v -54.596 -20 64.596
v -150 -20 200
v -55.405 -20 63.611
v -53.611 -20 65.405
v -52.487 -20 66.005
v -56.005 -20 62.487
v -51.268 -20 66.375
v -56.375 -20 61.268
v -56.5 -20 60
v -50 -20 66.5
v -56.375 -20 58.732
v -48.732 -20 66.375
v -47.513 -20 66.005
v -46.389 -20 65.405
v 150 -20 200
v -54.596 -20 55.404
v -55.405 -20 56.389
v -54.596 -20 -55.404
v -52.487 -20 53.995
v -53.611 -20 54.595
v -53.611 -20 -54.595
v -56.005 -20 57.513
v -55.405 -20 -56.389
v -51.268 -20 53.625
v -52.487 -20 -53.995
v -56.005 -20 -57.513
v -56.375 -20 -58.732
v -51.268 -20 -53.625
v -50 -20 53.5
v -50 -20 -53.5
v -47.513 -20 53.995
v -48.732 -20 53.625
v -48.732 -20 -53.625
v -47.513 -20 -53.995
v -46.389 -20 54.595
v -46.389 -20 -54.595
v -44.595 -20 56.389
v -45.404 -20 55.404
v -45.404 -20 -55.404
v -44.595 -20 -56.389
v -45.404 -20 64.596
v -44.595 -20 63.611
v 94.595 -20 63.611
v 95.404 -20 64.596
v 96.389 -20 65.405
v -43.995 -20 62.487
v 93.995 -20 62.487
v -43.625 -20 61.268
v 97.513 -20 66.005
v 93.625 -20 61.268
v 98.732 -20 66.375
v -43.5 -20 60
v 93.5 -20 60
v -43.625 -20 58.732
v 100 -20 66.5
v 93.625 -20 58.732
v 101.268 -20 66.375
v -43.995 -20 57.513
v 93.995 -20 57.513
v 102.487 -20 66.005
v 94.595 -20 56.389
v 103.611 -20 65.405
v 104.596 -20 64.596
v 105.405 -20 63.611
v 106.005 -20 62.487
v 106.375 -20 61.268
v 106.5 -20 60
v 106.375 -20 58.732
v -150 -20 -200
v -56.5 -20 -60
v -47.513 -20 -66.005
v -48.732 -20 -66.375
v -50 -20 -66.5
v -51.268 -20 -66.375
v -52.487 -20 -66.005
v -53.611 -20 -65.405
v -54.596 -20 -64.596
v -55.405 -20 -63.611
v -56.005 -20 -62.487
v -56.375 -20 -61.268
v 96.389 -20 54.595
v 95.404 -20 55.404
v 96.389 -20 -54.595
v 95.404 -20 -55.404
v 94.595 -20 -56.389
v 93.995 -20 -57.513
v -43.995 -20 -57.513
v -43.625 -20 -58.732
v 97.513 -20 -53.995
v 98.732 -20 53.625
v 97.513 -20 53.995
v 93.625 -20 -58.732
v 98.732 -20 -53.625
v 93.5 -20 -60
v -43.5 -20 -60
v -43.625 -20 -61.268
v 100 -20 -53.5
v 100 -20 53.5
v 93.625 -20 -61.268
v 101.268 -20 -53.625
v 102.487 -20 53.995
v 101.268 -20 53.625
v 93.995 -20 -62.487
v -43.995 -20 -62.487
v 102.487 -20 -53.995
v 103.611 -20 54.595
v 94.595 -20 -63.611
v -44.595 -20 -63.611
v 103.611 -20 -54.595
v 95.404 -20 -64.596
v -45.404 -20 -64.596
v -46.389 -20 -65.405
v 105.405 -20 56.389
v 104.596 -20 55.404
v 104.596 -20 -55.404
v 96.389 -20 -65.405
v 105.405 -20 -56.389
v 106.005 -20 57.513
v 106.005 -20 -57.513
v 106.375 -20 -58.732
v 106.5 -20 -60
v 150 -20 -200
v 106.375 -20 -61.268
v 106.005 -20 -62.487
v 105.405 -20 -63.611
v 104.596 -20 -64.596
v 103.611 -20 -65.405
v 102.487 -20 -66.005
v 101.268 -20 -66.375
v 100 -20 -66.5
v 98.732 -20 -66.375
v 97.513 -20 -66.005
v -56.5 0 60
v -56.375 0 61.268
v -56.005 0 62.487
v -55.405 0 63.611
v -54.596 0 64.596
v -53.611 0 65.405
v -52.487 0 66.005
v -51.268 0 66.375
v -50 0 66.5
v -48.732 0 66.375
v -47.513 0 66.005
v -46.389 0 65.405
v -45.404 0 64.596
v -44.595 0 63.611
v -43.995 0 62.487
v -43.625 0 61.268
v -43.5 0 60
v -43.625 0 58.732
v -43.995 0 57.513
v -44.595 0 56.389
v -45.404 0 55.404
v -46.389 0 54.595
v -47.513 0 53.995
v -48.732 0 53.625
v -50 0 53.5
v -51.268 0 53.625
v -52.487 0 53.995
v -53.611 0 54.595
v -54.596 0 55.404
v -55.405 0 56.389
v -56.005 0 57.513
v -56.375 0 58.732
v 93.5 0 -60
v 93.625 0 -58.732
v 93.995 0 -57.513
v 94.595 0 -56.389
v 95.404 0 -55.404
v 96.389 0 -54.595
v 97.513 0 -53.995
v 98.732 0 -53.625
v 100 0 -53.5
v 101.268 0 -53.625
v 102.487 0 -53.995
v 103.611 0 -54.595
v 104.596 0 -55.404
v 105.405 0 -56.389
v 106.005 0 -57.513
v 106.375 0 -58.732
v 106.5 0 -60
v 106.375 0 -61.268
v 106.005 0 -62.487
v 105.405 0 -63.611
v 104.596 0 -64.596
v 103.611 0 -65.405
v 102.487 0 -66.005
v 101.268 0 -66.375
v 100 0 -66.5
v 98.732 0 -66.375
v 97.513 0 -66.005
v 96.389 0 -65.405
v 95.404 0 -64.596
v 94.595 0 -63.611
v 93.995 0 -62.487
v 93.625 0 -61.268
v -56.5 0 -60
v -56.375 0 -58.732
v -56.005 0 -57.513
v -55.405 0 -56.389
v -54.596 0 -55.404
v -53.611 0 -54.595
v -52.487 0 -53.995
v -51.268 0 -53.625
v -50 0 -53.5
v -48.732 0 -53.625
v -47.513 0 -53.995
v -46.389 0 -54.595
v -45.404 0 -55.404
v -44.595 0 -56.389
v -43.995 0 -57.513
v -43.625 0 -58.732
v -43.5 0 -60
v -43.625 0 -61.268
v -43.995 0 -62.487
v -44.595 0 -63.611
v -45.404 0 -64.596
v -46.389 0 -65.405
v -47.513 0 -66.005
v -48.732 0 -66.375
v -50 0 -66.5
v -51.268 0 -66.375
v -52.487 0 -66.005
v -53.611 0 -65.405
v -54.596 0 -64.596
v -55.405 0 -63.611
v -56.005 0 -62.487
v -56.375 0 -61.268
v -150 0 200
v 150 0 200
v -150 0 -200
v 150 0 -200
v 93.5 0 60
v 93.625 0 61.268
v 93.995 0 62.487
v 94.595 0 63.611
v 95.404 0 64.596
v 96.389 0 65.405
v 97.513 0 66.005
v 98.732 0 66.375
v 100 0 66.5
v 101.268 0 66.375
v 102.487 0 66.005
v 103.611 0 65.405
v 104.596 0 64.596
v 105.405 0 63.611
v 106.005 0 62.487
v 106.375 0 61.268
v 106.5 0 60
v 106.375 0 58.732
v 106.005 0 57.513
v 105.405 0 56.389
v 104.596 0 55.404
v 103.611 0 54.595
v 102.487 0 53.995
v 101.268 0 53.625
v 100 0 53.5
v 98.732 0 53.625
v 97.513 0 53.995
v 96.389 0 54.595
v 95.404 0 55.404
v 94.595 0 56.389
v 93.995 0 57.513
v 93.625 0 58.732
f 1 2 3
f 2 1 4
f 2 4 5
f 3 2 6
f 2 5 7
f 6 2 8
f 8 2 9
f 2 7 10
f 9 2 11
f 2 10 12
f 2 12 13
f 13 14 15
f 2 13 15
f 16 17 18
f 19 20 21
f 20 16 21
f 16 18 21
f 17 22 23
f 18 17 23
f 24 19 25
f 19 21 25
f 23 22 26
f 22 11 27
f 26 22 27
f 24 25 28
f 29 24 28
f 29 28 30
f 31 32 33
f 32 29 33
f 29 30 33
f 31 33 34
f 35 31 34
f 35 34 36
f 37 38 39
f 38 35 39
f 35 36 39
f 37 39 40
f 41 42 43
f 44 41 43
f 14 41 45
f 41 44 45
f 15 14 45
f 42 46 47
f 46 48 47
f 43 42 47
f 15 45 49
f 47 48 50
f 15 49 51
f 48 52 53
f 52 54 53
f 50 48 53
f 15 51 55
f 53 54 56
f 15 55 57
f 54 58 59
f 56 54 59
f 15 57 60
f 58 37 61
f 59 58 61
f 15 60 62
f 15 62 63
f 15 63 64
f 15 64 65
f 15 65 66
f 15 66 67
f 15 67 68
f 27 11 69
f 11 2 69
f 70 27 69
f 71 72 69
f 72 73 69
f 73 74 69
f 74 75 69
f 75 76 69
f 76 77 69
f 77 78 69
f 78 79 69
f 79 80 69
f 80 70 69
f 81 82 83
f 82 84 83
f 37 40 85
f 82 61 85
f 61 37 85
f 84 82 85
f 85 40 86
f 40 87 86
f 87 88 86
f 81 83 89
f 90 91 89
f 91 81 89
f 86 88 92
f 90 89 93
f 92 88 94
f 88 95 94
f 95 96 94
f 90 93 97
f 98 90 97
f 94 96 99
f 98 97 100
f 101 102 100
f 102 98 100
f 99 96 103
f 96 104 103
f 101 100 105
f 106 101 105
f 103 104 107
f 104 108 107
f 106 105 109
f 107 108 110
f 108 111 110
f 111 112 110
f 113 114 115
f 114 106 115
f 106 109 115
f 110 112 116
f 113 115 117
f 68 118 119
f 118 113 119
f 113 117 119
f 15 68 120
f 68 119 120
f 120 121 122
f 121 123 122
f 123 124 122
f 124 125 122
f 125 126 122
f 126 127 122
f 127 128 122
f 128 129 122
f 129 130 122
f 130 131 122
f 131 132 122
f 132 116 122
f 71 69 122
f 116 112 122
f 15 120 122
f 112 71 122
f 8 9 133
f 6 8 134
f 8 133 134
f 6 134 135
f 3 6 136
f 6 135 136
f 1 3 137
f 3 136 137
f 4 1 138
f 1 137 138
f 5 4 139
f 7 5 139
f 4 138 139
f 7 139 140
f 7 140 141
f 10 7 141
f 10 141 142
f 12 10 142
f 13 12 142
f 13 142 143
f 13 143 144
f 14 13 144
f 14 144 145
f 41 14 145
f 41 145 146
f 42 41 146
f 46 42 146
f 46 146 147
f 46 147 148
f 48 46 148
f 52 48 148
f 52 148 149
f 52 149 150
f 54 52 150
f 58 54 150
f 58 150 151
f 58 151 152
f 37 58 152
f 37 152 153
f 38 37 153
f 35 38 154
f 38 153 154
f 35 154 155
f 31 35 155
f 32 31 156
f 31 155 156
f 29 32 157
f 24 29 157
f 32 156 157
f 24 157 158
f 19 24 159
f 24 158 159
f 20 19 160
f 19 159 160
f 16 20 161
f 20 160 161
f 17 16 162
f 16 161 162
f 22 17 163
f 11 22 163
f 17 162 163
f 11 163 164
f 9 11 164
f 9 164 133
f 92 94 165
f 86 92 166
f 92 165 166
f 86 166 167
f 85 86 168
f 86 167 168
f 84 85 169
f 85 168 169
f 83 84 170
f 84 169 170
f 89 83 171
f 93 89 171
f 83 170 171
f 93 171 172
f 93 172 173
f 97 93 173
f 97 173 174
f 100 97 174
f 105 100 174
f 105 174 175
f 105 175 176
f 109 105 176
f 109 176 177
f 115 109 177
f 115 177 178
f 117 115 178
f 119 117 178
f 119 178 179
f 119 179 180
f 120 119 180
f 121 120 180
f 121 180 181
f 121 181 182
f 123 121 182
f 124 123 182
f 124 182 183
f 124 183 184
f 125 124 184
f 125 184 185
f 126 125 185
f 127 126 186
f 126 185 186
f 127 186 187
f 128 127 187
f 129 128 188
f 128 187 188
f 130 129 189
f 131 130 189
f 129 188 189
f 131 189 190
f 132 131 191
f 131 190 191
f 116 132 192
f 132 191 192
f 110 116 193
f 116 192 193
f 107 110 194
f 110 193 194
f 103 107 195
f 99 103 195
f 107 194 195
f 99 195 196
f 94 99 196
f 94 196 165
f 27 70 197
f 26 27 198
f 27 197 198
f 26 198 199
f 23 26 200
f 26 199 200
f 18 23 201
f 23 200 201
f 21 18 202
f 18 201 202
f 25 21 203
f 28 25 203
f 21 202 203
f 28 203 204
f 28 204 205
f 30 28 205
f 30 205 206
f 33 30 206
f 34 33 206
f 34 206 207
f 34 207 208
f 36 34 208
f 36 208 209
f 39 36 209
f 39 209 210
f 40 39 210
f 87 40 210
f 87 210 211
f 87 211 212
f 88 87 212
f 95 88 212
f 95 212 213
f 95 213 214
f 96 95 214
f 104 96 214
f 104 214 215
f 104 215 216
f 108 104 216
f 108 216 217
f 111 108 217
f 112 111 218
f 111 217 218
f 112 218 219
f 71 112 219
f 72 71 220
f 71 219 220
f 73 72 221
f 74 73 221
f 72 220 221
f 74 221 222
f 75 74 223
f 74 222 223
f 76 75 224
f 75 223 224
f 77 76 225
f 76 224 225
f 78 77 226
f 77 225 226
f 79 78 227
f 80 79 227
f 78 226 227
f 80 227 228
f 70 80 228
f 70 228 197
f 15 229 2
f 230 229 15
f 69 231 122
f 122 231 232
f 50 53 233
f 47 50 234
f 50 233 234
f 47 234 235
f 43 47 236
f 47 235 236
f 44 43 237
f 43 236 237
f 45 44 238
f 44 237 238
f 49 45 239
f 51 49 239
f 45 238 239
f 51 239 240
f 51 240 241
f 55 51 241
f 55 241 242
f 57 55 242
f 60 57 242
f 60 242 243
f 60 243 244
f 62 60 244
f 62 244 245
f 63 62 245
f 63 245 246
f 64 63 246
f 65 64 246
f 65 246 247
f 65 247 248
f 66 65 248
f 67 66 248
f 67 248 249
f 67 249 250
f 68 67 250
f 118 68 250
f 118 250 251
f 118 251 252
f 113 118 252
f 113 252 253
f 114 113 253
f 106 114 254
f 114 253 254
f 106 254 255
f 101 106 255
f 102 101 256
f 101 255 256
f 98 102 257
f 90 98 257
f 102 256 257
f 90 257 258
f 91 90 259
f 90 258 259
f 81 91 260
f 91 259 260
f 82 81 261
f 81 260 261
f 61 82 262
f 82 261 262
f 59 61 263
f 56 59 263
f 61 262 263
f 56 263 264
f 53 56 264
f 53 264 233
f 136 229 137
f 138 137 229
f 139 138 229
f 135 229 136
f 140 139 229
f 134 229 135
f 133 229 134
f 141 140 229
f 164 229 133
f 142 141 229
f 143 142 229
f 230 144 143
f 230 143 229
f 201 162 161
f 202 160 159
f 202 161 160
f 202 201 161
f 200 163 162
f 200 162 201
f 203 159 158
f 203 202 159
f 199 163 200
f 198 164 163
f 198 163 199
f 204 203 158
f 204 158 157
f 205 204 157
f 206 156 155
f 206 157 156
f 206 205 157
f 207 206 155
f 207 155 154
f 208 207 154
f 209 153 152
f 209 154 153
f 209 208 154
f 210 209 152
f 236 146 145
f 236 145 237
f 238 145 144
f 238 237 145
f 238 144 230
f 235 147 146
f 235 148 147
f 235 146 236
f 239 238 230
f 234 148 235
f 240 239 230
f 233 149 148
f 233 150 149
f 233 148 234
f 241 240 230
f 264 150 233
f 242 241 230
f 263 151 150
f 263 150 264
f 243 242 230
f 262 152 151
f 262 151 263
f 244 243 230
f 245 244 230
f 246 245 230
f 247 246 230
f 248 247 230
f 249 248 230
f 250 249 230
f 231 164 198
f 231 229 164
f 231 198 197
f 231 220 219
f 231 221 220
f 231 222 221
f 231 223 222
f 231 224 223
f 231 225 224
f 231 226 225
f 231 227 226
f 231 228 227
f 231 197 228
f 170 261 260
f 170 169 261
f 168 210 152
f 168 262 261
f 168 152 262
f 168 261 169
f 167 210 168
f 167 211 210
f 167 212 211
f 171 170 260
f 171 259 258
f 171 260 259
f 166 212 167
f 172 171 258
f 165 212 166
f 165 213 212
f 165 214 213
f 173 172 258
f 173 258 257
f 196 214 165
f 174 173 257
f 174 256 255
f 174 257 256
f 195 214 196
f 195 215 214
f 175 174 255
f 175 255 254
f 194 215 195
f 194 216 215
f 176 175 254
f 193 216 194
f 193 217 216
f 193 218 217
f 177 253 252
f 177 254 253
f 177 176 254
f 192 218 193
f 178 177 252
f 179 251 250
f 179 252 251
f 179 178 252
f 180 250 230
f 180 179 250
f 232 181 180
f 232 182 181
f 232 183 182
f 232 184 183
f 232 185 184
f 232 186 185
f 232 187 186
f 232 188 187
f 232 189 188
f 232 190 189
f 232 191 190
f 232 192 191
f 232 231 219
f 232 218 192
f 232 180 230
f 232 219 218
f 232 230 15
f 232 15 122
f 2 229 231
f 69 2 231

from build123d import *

# Parameters (mm, degrees)
SKETCH1_W           = 300
SKETCH1_H           = 400
SUPPORT_PLATE_DEPTH = 20
SKETCH2_R           = 6.5
BOLT_HOLES_DEPTH    = 21


with BuildPart() as part:
    # Sketch1 → Support Plate (new body)
    with BuildSketch(Plane(origin=(0, 0, 0), x_dir=(1, 0, 0), z_dir=(0, 1, 0))):
        Rectangle(SKETCH1_W, SKETCH1_H)
    extrude(amount=-SUPPORT_PLATE_DEPTH)

    # Sketch2 → Bolt Holes (cut, through all)
    with BuildSketch(Plane(origin=(0, 0, 0), x_dir=(-1, 0, 0), z_dir=(0, 1, 0))):
        with Locations((-100, -60)):
            Circle(SKETCH2_R)
        with Locations((50, -60)):
            Circle(SKETCH2_R)
        with Locations((50, 60)):
            Circle(SKETCH2_R)
        with Locations((-100, 60)):
            Circle(SKETCH2_R)
    extrude(amount=-BOLT_HOLES_DEPTH, mode=Mode.SUBTRACT)


solid = part.part
